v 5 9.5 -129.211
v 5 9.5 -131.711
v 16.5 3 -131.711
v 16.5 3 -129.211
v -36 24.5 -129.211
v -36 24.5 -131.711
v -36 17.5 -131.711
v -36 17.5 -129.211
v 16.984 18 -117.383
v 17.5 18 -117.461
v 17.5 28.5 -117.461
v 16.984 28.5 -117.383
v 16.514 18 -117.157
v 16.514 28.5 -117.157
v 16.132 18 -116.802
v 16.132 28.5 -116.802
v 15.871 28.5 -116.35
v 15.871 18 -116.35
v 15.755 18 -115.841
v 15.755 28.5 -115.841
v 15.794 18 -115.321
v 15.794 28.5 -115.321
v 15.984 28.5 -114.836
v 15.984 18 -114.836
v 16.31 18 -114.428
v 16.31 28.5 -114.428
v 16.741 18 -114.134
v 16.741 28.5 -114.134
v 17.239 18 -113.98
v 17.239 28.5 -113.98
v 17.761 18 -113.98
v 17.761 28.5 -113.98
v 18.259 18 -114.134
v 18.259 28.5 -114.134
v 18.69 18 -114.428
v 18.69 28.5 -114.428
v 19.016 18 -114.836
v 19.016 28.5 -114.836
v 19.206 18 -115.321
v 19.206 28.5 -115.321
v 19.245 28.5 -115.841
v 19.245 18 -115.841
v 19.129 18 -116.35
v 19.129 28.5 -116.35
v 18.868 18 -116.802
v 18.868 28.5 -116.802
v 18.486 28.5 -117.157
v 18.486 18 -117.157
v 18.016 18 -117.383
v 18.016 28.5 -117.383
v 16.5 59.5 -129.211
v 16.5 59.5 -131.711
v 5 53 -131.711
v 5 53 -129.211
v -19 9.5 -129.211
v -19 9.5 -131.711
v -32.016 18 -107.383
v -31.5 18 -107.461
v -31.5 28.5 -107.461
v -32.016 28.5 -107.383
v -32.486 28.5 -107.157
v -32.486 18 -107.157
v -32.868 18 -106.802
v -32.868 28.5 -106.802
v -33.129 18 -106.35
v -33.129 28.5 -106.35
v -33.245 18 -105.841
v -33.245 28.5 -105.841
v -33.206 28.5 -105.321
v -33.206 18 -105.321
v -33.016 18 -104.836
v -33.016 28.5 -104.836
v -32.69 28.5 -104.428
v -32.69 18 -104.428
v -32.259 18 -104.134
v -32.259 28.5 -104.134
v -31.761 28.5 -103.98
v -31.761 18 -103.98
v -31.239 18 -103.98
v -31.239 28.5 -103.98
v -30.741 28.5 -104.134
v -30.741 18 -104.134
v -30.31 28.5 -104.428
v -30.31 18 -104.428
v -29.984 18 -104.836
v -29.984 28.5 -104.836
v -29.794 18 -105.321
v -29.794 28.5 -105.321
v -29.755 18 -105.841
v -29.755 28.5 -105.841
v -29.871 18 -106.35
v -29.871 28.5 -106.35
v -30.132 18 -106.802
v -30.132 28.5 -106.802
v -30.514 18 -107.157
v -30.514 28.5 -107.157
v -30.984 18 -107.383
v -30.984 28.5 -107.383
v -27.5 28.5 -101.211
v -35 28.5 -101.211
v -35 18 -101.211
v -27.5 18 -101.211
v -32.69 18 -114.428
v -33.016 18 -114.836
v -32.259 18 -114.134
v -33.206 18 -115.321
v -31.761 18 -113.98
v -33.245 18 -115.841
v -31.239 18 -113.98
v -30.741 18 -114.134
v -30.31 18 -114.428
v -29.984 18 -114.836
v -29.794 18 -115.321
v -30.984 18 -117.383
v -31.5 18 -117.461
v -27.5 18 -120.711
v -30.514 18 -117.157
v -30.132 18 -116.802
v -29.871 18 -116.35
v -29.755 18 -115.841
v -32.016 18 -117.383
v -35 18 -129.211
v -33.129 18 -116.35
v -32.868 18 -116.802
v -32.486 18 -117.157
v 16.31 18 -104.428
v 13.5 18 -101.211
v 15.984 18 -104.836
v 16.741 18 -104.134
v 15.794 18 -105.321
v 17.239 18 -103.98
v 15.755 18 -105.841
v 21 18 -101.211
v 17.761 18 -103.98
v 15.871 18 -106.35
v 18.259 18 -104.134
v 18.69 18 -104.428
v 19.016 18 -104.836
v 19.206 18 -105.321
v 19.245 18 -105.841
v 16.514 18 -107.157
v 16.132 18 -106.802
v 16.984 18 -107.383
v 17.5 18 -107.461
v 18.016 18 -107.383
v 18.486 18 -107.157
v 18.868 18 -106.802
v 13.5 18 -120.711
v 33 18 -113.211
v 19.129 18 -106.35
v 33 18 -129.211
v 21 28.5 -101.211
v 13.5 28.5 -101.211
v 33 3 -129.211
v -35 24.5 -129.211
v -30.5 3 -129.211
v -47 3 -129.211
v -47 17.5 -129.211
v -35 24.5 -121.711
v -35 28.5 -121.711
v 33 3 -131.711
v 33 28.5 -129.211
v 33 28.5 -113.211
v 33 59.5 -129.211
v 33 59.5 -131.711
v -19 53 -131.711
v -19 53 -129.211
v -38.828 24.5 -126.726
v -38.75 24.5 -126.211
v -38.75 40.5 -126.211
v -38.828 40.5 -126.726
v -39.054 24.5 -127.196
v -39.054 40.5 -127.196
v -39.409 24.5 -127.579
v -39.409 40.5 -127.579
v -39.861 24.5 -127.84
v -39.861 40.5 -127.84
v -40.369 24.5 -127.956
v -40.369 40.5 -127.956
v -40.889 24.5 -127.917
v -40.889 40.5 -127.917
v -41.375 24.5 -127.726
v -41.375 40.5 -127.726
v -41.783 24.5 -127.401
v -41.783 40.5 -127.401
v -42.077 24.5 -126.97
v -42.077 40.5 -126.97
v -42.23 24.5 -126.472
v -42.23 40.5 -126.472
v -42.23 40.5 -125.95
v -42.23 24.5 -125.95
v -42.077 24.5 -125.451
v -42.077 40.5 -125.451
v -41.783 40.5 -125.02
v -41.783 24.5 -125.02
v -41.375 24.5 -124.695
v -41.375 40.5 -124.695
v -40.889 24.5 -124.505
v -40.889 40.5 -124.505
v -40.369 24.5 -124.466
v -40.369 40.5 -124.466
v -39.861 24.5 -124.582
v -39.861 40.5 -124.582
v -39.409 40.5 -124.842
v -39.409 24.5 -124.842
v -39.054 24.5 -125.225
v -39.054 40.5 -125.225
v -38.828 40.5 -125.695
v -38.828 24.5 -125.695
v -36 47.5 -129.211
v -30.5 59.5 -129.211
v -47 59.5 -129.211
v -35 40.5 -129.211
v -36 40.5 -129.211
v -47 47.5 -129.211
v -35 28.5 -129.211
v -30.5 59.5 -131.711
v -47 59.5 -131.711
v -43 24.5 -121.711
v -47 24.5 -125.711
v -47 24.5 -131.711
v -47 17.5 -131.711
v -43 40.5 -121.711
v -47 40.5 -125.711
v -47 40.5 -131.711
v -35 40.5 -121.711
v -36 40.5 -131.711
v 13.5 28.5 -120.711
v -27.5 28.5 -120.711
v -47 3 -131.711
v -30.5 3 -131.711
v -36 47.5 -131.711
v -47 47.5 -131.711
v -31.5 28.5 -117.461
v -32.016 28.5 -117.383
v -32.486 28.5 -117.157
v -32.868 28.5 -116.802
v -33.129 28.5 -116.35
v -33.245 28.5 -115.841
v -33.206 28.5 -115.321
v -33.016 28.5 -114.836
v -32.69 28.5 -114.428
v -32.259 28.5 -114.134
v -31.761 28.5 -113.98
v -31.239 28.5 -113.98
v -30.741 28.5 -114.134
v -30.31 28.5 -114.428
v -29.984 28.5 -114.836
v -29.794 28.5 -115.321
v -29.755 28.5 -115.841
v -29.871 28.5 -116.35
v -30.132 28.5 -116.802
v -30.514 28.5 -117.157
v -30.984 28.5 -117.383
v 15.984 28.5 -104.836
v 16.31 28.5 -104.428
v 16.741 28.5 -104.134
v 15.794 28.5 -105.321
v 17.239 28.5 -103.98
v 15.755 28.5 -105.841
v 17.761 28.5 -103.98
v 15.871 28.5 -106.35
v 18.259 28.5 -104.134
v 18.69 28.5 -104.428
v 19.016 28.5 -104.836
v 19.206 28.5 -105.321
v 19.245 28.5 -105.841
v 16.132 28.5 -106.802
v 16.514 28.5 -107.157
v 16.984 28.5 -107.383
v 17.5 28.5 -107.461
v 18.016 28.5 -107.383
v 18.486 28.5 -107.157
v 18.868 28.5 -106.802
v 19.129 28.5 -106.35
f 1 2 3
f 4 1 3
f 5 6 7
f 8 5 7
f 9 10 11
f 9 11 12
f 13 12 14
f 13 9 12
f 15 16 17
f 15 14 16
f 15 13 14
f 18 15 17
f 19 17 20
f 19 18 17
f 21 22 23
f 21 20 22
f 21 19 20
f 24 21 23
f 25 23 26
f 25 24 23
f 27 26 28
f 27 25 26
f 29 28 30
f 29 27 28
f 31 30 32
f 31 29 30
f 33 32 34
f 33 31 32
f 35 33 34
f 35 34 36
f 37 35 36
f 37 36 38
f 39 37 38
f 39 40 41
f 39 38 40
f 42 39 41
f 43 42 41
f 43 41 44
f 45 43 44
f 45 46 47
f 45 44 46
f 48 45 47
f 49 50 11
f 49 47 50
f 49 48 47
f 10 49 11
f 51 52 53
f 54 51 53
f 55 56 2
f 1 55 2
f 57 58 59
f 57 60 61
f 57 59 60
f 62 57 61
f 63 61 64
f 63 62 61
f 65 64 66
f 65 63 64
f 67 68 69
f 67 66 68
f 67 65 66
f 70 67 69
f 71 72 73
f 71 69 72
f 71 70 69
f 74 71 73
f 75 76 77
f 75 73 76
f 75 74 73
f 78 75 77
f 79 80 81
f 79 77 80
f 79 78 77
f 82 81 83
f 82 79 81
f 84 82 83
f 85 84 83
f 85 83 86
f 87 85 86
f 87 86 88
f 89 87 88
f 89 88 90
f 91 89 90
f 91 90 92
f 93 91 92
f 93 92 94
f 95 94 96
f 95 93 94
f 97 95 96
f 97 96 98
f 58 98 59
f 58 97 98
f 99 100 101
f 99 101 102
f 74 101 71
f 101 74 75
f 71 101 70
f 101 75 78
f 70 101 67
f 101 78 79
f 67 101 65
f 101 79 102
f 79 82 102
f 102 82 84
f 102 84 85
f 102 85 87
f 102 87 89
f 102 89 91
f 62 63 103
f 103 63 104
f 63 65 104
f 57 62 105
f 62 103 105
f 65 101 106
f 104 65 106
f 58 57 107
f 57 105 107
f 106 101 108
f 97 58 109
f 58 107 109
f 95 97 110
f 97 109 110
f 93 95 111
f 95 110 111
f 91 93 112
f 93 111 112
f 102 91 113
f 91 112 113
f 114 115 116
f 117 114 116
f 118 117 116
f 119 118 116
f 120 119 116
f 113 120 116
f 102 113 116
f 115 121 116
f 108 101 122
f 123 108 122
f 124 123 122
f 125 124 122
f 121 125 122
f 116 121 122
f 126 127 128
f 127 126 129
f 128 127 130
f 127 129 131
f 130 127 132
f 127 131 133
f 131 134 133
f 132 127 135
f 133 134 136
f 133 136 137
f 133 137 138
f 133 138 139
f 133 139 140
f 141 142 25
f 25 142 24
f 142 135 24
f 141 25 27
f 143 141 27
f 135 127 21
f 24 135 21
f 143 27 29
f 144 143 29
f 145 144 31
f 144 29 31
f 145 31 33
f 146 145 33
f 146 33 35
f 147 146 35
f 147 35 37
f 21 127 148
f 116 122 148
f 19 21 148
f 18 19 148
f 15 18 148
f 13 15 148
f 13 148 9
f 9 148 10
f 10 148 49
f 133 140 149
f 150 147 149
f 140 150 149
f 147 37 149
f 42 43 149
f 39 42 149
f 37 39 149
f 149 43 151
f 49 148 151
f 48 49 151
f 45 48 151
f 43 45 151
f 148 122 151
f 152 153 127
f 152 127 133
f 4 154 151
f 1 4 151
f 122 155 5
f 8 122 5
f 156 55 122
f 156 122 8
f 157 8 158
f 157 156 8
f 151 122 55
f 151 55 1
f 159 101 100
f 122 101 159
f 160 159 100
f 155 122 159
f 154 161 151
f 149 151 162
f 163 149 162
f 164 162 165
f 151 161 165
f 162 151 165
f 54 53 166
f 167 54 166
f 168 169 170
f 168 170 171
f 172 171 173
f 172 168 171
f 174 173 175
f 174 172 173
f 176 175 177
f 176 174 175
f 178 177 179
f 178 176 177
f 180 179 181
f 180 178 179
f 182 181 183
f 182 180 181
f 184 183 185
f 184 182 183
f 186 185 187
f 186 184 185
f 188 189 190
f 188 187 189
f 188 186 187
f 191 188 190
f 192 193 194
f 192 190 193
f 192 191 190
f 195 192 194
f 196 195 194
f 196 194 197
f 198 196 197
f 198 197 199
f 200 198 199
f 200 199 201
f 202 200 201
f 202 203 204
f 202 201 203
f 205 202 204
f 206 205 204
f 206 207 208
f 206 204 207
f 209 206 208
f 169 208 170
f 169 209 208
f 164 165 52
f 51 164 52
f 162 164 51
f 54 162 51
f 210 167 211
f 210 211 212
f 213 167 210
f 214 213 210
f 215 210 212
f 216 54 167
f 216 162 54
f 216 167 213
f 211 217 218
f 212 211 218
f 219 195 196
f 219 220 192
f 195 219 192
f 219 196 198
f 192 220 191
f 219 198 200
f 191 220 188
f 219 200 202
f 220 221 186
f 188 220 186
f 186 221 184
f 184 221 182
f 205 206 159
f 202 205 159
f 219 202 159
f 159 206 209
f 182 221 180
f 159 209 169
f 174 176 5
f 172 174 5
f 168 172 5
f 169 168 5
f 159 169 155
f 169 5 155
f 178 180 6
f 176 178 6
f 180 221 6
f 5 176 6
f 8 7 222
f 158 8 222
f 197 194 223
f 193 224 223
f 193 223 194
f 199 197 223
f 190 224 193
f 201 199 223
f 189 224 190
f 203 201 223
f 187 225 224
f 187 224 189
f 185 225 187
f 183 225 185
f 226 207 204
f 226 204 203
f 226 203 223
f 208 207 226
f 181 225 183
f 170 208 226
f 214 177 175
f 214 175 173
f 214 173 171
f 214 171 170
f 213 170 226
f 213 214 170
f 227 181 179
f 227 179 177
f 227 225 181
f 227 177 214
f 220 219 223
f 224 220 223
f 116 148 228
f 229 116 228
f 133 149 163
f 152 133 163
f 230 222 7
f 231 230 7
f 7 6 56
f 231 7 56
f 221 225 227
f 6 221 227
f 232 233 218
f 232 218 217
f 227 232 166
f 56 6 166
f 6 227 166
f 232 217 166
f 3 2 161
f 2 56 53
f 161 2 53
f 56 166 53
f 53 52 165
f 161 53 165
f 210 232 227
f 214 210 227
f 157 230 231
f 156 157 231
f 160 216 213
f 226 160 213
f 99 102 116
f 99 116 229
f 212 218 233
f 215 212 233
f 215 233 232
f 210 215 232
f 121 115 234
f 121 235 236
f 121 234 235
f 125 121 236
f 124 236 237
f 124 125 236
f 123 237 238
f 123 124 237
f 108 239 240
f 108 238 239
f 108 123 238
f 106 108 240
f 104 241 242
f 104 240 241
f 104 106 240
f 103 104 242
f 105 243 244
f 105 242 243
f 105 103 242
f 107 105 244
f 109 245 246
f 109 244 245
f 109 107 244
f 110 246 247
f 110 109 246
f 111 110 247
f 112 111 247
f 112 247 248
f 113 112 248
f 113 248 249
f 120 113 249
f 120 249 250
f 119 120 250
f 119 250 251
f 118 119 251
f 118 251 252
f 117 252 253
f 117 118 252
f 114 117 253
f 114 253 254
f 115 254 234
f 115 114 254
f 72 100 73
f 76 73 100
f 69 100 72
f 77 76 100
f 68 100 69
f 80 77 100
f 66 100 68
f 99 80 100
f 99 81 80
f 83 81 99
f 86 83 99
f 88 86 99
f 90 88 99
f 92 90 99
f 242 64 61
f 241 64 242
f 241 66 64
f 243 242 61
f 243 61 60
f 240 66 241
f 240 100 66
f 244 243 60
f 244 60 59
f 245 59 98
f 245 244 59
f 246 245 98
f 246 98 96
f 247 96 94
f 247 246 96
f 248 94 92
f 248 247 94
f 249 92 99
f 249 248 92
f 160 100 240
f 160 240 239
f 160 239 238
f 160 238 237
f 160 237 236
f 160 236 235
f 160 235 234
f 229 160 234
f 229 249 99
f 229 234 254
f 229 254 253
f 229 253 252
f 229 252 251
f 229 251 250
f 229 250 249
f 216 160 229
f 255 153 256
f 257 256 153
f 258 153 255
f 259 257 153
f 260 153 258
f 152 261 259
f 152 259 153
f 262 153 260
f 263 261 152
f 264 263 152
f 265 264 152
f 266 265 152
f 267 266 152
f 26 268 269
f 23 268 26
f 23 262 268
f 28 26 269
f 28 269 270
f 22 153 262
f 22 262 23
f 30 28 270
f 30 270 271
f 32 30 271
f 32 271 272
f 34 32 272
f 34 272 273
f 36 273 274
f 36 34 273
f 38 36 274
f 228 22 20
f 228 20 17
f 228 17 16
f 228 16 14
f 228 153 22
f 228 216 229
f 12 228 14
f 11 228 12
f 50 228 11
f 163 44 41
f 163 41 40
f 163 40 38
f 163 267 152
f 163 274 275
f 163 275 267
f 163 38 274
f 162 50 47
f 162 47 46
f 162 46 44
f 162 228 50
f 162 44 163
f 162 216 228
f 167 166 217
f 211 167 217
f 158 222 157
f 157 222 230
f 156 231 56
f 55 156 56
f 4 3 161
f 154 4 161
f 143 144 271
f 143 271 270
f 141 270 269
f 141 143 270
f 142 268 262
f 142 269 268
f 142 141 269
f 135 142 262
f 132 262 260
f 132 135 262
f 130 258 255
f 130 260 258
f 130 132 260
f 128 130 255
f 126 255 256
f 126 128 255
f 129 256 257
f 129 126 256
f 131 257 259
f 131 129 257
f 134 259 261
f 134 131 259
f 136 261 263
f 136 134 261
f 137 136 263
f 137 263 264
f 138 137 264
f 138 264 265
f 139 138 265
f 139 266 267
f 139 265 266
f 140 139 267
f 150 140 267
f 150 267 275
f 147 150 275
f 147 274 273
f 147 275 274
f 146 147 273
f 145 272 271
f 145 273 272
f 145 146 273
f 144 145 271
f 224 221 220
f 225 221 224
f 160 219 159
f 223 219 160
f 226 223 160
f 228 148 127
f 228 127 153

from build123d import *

# Parameters (mm, degrees)
CYLINDER016_R             = 1.75
CYLINDER016_DEPTH         = 70
CYLINDER016_ROLL_ANGLE    = -90
CYLINDER026_R             = 1.75
CYLINDER026_DEPTH         = 24.5
CYLINDER026_PITCH_ANGLE   = 90
CYLINDER027_R             = 3
CYLINDER027_DEPTH         = 21.5
CYLINDER027_PITCH_ANGLE   = 90
FUSION007_PITCH_ANGLE     = -90
FUSION007_PLACEMENT_ANGLE = -180
FUSION008_PITCH_ANGLE     = -90
FUSION008_PLACEMENT_ANGLE = -180
FUSION005_PITCH_ANGLE     = -90
FUSION005_PLACEMENT_ANGLE = -180
FUSION006_PITCH_ANGLE     = -90
FUSION006_PLACEMENT_ANGLE = -180
BOX021_W                  = 37
BOX021_H                  = 41
BOX021_DEPTH              = 25
BOX021_PITCH_ANGLE        = -90
BOX021_PLACEMENT_ANGLE    = -180
FUSION012_PITCH_ANGLE     = -90
FUSION012_PLACEMENT_ANGLE = -90
BOX007_W                  = 68
BOX007_H                  = 10.5
BOX007_DEPTH              = 29
CHAMFER_SIZE              = 12
BOX057_W                  = 12
BOX057_H                  = 16
BOX057_DEPTH              = 10
PAD005_DEPTH              = 2.5
CHAMFER009_SIZE           = 4


with BuildPart() as cylinder016:
    # Cylinder016 → Cylinder016 (new body)
    with BuildSketch(Plane.XY):
        Circle(CYLINDER016_R)
    extrude(amount=CYLINDER016_DEPTH)


with BuildPart() as cylinder016_1:
    # Cylinder016 roll: moved
    add(cylinder016.part.rotate(Axis((0, 0, 0), (1, 0, 0)), CYLINDER016_ROLL_ANGLE))


with BuildPart() as cylinder016_2:
    # Cylinder016 placement: moved
    add(cylinder016_1.part.moved(Location((-40.5, -5, -149.5))))


with BuildPart() as joint_d010:
    # Cylinder026 → Cylinder026 (new body)
    with BuildSketch(Plane.XY):
        Circle(CYLINDER026_R)
    extrude(amount=CYLINDER026_DEPTH)


with BuildPart() as joint_d010_1:
    # Cylinder026 pitch: moved
    add(joint_d010.part.rotate(Axis((0, 0, 0), (0, 1, 0)), CYLINDER026_PITCH_ANGLE))


with BuildPart() as joint_d010_2:
    # Cylinder026 placement: moved
    add(joint_d010_1.part.moved(Location((16, -24.5, 7))))


with BuildPart() as joint_d011:
    # Cylinder027 → Cylinder027 (new body)
    with BuildSketch(Plane.XY):
        Circle(CYLINDER027_R)
    extrude(amount=CYLINDER027_DEPTH)


with BuildPart() as joint_d011_1:
    # Cylinder027 pitch: moved
    add(joint_d011.part.rotate(Axis((0, 0, 0), (0, 1, 0)), CYLINDER027_PITCH_ANGLE))


with BuildPart() as joint_d011_2:
    # Cylinder027 placement: moved
    add(joint_d011_1.part.moved(Location((37, -24.5, 7))))


with BuildPart() as fusion007:
    # Fusion007 base: copy of Joint-D011
    add(joint_d011_2.part)

    # Fusion007: union Joint-D010
    add(joint_d010_2.part)


with BuildPart() as fusion007_1:
    # Fusion007 pitch: moved
    add(fusion007.part.rotate(Axis((0, 0, 0), (0, 1, 0)), FUSION007_PITCH_ANGLE))


with BuildPart() as fusion007_2:
    # Fusion007 placement: moved
    add(fusion007_1.part.moved(Location((-12, -39.5, 0))).rotate(Axis((-12, -39.5, 0), (0, 0, 1)), FUSION007_PLACEMENT_ANGLE))


with BuildPart() as fusion008:
    # Fusion008 base: copy of Joint-D011
    add(joint_d011_2.part)

    # Fusion008: union Joint-D010
    add(joint_d010_2.part)


with BuildPart() as fusion008_1:
    # Fusion008 pitch: moved
    add(fusion008.part.rotate(Axis((0, 0, 0), (0, 1, 0)), FUSION008_PITCH_ANGLE))


with BuildPart() as fusion008_2:
    # Fusion008 placement: moved
    add(fusion008_1.part.moved(Location((-2, -39.5, 0))).rotate(Axis((-2, -39.5, 0), (0, 0, 1)), FUSION008_PLACEMENT_ANGLE))


with BuildPart() as fusion005:
    # Fusion005 base: copy of Joint-D011
    add(joint_d011_2.part)

    # Fusion005: union Joint-D010
    add(joint_d010_2.part)


with BuildPart() as fusion005_1:
    # Fusion005 pitch: moved
    add(fusion005.part.rotate(Axis((0, 0, 0), (0, 1, 0)), FUSION005_PITCH_ANGLE))


with BuildPart() as fusion005_2:
    # Fusion005 placement: moved
    add(fusion005_1.part.moved(Location((-12, 9.5, 0))).rotate(Axis((-12, 9.5, 0), (0, 0, 1)), FUSION005_PLACEMENT_ANGLE))


with BuildPart() as fusion006:
    # Fusion006 base: copy of Joint-D011
    add(joint_d011_2.part)

    # Fusion006: union Joint-D010
    add(joint_d010_2.part)


with BuildPart() as fusion006_1:
    # Fusion006 pitch: moved
    add(fusion006.part.rotate(Axis((0, 0, 0), (0, 1, 0)), FUSION006_PITCH_ANGLE))


with BuildPart() as fusion006_2:
    # Fusion006 placement: moved
    add(fusion006_1.part.moved(Location((-2, 9.5, 0))).rotate(Axis((-2, 9.5, 0), (0, 0, 1)), FUSION006_PLACEMENT_ANGLE))


with BuildPart() as fusion012:
    # Box021 → Box021 (new body)
    with BuildSketch(Plane.XY):
        with Locations((18.5, 20.5)):
            Rectangle(BOX021_W, BOX021_H)
    extrude(amount=BOX021_DEPTH)


with BuildPart() as fusion012_1:
    # Box021 pitch: moved
    add(fusion012.part.rotate(Axis((0, 0, 0), (0, 1, 0)), BOX021_PITCH_ANGLE))


with BuildPart() as fusion012_2:
    # Box021 placement: moved
    add(fusion012_1.part.moved(Location((-10, 30, -1))).rotate(Axis((-10, 30, -1), (0, 0, 1)), BOX021_PLACEMENT_ANGLE))

    # Fusion012: union Fusion007, Fusion008, Fusion005, Fusion006
    add(fusion007_2.part)
    add(fusion008_2.part)
    add(fusion005_2.part)
    add(fusion006_2.part)


with BuildPart() as fusion012_3:
    # Fusion012 pitch: moved
    add(fusion012_2.part.rotate(Axis((0, 0, 0), (0, 1, 0)), FUSION012_PITCH_ANGLE))


with BuildPart() as fusion012_4:
    # Fusion012 placement: moved
    add(fusion012_3.part.moved(Location((-16.5, -5, -134))).rotate(Axis((-16.5, -5, -134), (0, 0, 1)), FUSION012_PLACEMENT_ANGLE))


with BuildPart() as chamfer_body:
    # Box007 → Box007 (new body)
    with BuildSketch(Plane(origin=(-35, 18, -153.5), x_dir=(1, 0, 0), z_dir=(0, 0, 1))):
        with Locations((34, 5.25)):
            Rectangle(BOX007_W, BOX007_H)
    extrude(amount=BOX007_DEPTH)

    # Chamfer
    chamfer_edges = [chamfer_body.edges().sort_by_distance(p)[0] for p in [
        (33, 23.25, -124.5),
    ]]
    chamfer(chamfer_edges, length=CHAMFER_SIZE)


with BuildPart() as cube060:
    # Box057 → Box057 (new body)
    with BuildSketch(Plane(origin=(-47, 24.5, -155), x_dir=(1, 0, 0), z_dir=(0, 0, 1))):
        with Locations((6, 8)):
            Rectangle(BOX057_W, BOX057_H)
    extrude(amount=BOX057_DEPTH)


with BuildPart() as clone_of_chamfer009:
    # Sketch007 → Pad005 (new body)
    with BuildSketch(Plane(origin=(0, 0, -155), x_dir=(1, 0, 0), z_dir=(0, 0, -1))):
        Polygon((-47, -17.5), (-47, -3), (-30.5, -3), (-19, -9.5), (5, -9.5), (16.5, -3), (33, -3), (33, -59.5), (16.5, -59.5), (5, -53), (-19, -53), (-30.5, -59.5), (-47, -59.5), (-47, -47.5), (-36, -47.5), (-36, -17.5), align=None)
    extrude(amount=-PAD005_DEPTH)

    # Fusion: union Chamfer body, Cube060
    add(chamfer_body.part)
    add(cube060.part)

    # Cut083: cut Fusion012
    add(fusion012_4.part, mode=Mode.SUBTRACT)

    # Cut084: cut Cylinder016
    add(cylinder016_2.part, mode=Mode.SUBTRACT)

    # Chamfer009
    chamfer009_edges = [clone_of_chamfer009.edges().sort_by_distance(p)[0] for p in [
        (-47, 32.5, -145),
    ]]
    chamfer(chamfer009_edges, length=CHAMFER009_SIZE)


with BuildPart() as clone_of_chamfer009_1:
    # Chamfer009 placement: moved
    add(clone_of_chamfer009.part.moved(Location((0, 0, 94))))


with BuildPart() as clone_of_chamfer009_2:
    # Clone015 placement: moved
    add(clone_of_chamfer009_1.part.moved(Location((0, 0, -70.710678))))


solid = clone_of_chamfer009_2.part
